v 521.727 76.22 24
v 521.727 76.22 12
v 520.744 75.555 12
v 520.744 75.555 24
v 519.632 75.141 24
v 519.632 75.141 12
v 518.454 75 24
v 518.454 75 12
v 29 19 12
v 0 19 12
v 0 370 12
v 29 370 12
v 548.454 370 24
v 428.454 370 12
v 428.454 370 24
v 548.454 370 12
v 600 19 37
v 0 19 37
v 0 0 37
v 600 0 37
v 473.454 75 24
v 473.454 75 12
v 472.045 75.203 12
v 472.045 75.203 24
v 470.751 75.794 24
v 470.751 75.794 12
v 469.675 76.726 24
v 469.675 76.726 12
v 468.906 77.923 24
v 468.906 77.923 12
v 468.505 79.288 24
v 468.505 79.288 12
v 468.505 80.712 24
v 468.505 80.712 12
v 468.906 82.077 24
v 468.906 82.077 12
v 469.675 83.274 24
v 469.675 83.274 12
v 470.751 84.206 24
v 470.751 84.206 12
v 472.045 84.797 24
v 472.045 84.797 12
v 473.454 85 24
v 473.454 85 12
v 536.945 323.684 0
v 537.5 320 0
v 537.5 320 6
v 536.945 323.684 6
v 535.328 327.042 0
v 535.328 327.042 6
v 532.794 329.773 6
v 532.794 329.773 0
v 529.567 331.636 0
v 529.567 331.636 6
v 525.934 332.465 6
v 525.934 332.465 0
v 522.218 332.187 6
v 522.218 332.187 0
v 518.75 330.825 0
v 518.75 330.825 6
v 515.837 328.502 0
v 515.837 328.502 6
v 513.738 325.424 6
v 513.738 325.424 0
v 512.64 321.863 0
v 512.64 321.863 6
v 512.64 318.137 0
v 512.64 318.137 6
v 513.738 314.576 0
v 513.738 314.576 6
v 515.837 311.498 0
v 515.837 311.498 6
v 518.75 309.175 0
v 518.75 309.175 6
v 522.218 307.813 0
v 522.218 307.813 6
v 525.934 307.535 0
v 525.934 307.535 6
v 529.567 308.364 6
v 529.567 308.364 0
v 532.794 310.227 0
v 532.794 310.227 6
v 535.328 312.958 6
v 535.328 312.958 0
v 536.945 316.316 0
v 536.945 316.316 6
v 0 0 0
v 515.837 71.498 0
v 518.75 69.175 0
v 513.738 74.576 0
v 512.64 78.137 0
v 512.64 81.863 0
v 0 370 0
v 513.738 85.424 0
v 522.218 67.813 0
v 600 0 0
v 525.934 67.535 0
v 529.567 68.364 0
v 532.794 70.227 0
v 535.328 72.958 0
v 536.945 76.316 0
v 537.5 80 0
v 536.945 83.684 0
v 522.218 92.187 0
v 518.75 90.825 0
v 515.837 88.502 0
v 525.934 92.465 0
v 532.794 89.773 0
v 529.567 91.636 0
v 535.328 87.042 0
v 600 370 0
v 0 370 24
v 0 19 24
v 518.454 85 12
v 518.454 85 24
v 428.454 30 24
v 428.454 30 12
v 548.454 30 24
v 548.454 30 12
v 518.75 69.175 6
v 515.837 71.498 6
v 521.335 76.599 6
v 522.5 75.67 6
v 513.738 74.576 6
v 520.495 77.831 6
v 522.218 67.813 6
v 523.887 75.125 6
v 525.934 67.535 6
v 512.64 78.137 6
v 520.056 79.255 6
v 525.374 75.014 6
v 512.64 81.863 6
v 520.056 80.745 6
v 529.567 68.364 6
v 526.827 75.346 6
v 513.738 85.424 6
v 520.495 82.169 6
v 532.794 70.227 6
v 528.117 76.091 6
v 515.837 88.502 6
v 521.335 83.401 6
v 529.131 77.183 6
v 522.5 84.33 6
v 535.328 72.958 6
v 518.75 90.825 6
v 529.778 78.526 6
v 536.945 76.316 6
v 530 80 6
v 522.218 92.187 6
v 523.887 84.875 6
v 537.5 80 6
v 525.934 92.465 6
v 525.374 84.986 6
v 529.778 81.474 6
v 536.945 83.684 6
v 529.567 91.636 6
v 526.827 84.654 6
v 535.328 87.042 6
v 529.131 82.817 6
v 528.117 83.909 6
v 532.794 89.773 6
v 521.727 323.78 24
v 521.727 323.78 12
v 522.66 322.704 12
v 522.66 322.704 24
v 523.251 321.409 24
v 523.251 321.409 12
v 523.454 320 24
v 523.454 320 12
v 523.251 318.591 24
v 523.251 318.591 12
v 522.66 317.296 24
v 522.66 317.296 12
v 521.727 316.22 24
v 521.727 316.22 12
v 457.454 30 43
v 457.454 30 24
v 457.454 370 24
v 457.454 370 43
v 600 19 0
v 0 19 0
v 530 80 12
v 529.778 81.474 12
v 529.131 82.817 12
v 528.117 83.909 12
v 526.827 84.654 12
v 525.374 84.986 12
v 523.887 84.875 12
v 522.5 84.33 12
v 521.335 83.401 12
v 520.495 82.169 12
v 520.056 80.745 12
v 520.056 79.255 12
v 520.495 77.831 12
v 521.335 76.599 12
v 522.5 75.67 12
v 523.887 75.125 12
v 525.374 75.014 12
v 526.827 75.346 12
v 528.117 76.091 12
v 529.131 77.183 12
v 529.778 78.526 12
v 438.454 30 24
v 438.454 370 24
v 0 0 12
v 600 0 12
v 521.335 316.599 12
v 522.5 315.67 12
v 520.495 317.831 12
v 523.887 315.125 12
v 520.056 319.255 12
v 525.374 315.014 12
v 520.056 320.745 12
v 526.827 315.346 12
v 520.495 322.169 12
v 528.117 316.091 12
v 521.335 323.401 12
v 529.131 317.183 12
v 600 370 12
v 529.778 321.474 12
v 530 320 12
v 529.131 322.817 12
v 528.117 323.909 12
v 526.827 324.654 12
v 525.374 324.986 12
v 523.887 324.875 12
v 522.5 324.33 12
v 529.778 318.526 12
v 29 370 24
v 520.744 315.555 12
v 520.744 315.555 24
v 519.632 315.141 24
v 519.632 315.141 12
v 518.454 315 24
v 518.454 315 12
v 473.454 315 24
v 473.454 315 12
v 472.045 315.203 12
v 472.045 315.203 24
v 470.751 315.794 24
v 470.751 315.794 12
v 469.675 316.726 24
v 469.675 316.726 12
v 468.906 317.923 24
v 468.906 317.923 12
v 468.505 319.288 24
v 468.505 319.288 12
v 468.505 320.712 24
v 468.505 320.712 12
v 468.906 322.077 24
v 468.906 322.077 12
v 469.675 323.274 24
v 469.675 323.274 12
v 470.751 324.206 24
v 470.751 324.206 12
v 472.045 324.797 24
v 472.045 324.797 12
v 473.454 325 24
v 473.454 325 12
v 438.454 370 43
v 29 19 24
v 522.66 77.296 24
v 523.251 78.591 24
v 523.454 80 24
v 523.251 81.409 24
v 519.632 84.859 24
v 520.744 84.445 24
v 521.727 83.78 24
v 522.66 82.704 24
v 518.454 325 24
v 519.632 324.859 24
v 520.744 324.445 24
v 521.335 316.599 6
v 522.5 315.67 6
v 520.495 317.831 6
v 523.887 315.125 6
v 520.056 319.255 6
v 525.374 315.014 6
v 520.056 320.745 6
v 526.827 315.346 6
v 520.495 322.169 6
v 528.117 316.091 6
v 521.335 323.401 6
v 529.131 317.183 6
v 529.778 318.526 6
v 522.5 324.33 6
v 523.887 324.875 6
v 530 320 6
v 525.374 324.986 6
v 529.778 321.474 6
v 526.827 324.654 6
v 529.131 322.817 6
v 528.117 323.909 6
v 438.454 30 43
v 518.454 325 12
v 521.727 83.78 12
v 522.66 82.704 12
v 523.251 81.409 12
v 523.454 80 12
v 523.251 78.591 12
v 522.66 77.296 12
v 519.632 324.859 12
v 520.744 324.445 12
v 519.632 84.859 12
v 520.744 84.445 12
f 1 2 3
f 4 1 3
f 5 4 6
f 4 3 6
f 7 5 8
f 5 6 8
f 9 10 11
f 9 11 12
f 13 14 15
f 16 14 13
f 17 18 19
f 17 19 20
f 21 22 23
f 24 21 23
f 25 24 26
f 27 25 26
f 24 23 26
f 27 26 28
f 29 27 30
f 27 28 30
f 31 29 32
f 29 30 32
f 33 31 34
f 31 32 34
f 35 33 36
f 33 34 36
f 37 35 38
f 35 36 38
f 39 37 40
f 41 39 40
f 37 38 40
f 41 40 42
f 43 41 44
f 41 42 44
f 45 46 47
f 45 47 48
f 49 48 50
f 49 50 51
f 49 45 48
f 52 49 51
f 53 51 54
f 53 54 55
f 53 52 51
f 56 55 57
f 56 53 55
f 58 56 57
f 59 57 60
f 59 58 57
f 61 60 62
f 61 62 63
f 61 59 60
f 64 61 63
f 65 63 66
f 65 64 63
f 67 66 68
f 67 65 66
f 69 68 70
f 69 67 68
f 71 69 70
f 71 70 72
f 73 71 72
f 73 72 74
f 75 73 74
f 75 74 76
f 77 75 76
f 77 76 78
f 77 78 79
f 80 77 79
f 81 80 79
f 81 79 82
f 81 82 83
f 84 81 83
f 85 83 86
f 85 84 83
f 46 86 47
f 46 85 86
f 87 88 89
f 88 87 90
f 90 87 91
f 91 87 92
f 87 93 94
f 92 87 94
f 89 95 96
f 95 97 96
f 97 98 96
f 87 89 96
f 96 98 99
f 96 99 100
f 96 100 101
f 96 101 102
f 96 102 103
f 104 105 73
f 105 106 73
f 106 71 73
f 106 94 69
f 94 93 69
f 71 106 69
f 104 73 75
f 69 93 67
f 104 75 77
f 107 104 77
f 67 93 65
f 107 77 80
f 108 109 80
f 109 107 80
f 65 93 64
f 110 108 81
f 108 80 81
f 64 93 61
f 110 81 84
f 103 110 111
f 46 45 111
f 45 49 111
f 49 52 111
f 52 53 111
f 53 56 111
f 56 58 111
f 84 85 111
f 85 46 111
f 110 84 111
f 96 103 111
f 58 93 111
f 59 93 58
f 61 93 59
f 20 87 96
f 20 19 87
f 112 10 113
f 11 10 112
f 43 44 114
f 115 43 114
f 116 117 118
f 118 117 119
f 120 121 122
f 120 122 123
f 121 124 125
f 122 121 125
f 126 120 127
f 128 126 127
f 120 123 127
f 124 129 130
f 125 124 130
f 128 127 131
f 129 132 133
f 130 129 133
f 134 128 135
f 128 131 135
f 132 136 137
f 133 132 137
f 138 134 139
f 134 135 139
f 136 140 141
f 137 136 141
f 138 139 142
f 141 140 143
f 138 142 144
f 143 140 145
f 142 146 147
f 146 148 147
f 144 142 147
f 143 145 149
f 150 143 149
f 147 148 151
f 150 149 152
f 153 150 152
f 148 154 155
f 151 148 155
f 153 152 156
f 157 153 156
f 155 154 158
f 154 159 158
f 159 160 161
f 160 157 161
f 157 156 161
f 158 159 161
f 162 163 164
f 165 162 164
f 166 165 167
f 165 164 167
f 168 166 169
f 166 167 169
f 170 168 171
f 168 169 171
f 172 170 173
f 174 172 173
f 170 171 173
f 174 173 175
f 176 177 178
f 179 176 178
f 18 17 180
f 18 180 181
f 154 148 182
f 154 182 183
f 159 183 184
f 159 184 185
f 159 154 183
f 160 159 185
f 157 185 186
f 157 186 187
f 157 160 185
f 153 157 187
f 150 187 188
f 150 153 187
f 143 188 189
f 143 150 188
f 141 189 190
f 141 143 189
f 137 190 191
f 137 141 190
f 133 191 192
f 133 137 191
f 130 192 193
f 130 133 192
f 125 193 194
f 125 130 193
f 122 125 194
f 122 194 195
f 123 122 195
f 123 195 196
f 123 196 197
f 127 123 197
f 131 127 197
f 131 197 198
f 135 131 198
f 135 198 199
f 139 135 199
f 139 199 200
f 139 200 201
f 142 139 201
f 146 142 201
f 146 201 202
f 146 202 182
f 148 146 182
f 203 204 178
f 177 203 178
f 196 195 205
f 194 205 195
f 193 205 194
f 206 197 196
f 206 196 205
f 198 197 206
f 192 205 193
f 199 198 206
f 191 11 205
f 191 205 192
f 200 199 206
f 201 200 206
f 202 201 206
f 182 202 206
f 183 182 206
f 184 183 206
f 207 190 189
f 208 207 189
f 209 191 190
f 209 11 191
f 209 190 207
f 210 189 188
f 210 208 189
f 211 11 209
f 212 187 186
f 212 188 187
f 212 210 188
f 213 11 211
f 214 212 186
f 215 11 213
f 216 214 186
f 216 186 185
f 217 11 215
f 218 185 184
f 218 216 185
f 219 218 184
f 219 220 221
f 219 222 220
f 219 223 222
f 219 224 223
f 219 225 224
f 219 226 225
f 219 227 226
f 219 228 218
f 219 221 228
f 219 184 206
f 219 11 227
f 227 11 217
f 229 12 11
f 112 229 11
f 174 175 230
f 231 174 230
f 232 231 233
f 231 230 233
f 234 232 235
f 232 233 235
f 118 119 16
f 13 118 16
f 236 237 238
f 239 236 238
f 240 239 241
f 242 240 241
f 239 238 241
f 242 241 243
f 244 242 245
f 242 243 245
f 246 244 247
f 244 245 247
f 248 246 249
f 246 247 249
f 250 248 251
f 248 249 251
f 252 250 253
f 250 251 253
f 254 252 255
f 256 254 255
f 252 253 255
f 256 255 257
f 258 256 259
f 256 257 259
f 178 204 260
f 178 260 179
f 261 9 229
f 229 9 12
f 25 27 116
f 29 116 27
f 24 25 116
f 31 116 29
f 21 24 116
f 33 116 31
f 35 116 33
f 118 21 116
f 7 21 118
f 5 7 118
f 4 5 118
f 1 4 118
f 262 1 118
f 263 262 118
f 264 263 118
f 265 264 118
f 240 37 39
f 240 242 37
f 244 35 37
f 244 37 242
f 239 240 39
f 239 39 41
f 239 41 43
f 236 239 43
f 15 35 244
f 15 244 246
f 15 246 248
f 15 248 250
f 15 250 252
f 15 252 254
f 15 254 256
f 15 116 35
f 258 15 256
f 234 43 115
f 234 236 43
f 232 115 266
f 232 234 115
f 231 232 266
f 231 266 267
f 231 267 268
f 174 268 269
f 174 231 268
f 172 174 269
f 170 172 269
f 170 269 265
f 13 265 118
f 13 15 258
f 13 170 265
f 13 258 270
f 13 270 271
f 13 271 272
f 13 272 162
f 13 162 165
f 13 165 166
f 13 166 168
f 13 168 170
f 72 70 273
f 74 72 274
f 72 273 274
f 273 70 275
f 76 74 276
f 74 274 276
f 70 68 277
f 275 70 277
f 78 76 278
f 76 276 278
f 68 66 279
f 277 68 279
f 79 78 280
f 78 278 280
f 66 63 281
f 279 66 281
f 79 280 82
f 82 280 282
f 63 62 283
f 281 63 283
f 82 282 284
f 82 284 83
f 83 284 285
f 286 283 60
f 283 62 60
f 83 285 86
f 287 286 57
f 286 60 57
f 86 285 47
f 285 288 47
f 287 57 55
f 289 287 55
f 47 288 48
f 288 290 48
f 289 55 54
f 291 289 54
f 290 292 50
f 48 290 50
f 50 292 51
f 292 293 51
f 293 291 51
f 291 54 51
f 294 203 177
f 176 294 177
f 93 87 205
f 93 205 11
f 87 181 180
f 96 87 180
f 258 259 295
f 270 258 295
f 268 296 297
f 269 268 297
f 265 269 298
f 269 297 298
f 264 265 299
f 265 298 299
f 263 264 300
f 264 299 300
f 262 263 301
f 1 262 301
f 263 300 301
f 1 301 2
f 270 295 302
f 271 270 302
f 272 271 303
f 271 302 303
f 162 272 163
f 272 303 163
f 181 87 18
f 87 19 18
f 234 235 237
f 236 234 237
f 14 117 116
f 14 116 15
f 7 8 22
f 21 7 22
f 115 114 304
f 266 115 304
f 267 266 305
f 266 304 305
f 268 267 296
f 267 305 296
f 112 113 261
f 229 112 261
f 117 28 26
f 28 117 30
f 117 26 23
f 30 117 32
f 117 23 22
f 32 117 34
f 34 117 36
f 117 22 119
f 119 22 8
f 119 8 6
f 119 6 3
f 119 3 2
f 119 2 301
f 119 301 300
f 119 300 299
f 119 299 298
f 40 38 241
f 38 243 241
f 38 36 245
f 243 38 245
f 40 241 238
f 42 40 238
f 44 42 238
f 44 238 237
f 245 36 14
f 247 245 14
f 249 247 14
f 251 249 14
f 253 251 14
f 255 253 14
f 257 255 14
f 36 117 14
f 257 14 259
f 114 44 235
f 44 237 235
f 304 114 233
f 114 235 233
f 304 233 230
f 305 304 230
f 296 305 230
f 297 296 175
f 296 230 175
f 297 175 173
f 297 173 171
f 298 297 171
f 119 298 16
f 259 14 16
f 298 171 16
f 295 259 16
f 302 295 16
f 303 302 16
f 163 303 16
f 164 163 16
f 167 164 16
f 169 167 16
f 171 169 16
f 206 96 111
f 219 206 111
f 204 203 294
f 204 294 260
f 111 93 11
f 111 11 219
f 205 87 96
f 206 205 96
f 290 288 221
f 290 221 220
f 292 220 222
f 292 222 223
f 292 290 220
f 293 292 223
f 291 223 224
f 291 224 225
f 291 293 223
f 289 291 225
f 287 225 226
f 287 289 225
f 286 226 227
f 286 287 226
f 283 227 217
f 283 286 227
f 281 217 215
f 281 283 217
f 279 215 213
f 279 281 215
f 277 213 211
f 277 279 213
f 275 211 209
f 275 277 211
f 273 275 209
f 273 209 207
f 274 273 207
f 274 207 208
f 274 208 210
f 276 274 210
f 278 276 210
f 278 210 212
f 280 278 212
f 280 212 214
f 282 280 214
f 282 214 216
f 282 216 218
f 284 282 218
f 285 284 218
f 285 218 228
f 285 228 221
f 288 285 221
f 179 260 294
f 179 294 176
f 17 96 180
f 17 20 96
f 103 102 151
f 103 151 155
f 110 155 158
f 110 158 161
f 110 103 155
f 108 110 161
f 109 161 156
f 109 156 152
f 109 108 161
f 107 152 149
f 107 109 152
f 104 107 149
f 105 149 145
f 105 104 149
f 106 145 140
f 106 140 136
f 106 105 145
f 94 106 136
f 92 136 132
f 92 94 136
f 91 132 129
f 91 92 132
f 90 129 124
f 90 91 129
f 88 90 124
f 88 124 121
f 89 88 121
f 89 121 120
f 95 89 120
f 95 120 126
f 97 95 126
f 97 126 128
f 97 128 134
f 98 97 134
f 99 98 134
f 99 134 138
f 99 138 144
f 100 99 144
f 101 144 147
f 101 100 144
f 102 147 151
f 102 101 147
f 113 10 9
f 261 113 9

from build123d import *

# Parameters (mm, degrees)
F0_W          = 600
F0_H          = 370
F0_R          = 12.5
F0_R_2        = 5
F1_DEPTH      = 12
F2_DEPTH      = 6
F3_W          = 120
F3_H          = 340
F3_W_2        = 10
F3_H_2        = 351
F3_W_3        = 19
F4_DEPTH      = 12
F5_W          = 19
F5_H          = 340
F6_DEPTH      = 19
F3_W_4        = 571
F3_H_3        = 19
F7_DEPTH      = 25
F7_DEPTH_BACK = 12


with BuildPart() as f1:
    # F0 (on Top) → F1 (new body)
    with BuildSketch(Plane.XY):
        with Locations((300, 185)):
            Rectangle(F0_W, F0_H)
        with Locations((525, 80)):
            Circle(F0_R, mode=Mode.SUBTRACT)
        with Locations((525, 320)):
            Circle(F0_R, mode=Mode.SUBTRACT)
        with Locations((525, 80)):
            Circle(F0_R)
        with Locations((525, 80)):
            Circle(F0_R_2, mode=Mode.SUBTRACT)
        with Locations((525, 320)):
            Circle(F0_R)
        with Locations((525, 320)):
            Circle(F0_R_2, mode=Mode.SUBTRACT)
    extrude(amount=F1_DEPTH)

    # F0 (on Top) → F2 (cut)
    with BuildSketch(Plane.XY):
        with Locations((525, 80)):
            Circle(F0_R)
        with Locations((525, 80)):
            Circle(F0_R_2, mode=Mode.SUBTRACT)
        with Locations((525, 320)):
            Circle(F0_R)
        with Locations((525, 320)):
            Circle(F0_R_2, mode=Mode.SUBTRACT)
    extrude(amount=F2_DEPTH, mode=Mode.SUBTRACT)


with BuildPart() as f4:
    # F3 (on face) → F4 (new body)
    with BuildSketch(Plane.XY.offset(12)):
        with Locations((488.453896, 200)):
            Rectangle(F3_W, F3_H)
        with BuildLine():
            ThreePointArc((473.453896, 75), (468.453896, 80), (473.453896, 85))
            Line((473.453896, 85), (518.453896, 85))
            ThreePointArc((518.453896, 85), (520.200441, 84.685038), (521.726948, 83.779832))
            ThreePointArc((521.726948, 83.779832), (527.077828, 84.547816), (530, 80))
            ThreePointArc((530, 80), (527.077828, 75.452184), (521.726948, 76.220168))
            ThreePointArc((521.726948, 76.220168), (520.200441, 75.314962), (518.453896, 75))
            Line((518.453896, 75), (473.453896, 75))
        make_face(mode=Mode.SUBTRACT)
        with BuildLine():
            Line((518.453896, 315), (473.453896, 315))
            ThreePointArc((473.453896, 315), (468.453896, 320), (473.453896, 325))
            Line((473.453896, 325), (518.453896, 325))
            ThreePointArc((518.453896, 325), (520.200441, 324.685038), (521.726948, 323.779832))
            ThreePointArc((521.726948, 323.779832), (527.077828, 324.547816), (530, 320))
            ThreePointArc((530, 320), (527.077828, 315.452184), (521.726948, 316.220168))
            ThreePointArc((521.726948, 316.220168), (520.200441, 315.314962), (518.453896, 315))
        make_face(mode=Mode.SUBTRACT)
        with BuildLine():
            ThreePointArc((521.726948, 323.779832), (523.453896, 320), (521.726948, 316.220168))
            ThreePointArc((521.726948, 316.220168), (527.077828, 315.452184), (530, 320))
            ThreePointArc((530, 320), (527.077828, 324.547816), (521.726948, 323.779832))
        make_face()
        with BuildLine():
            ThreePointArc((530, 80), (527.077828, 84.547816), (521.726948, 83.779832))
            ThreePointArc((521.726948, 83.779832), (523.453896, 80), (521.726948, 76.220168))
            ThreePointArc((521.726948, 76.220168), (527.077828, 75.452184), (530, 80))
        make_face()
        with Locations((24, 194.5)):
            Rectangle(F3_W_2, F3_H_2)
        with Locations((9.5, 194.5)):
            Rectangle(F3_W_3, F3_H_2)
    extrude(amount=F4_DEPTH)


with BuildPart() as f6:
    # F5 (on face) → F6 (new body)
    with BuildSketch(Plane.XY.offset(24)):
        with Locations((447.953896, 200)):
            Rectangle(F5_W, F5_H)
    extrude(amount=F6_DEPTH)


with BuildPart() as f7:
    # F3 (on face) → F7 (new body, two sides)
    with BuildSketch(Plane.XY.offset(12)) as f7_sk:
        with Locations((314.5, 9.5)):
            Rectangle(F3_W_4, F3_H_3)
        with Locations((9.5, 9.5)):
            Rectangle(F3_W_3, F3_H_3)
        with Locations((24, 9.5)):
            Rectangle(F3_W_2, F3_H_3)
    extrude(amount=F7_DEPTH)
    extrude(f7_sk.sketch, amount=-F7_DEPTH_BACK)


solid = Compound([f1.part, f4.part, f6.part, f7.part])
